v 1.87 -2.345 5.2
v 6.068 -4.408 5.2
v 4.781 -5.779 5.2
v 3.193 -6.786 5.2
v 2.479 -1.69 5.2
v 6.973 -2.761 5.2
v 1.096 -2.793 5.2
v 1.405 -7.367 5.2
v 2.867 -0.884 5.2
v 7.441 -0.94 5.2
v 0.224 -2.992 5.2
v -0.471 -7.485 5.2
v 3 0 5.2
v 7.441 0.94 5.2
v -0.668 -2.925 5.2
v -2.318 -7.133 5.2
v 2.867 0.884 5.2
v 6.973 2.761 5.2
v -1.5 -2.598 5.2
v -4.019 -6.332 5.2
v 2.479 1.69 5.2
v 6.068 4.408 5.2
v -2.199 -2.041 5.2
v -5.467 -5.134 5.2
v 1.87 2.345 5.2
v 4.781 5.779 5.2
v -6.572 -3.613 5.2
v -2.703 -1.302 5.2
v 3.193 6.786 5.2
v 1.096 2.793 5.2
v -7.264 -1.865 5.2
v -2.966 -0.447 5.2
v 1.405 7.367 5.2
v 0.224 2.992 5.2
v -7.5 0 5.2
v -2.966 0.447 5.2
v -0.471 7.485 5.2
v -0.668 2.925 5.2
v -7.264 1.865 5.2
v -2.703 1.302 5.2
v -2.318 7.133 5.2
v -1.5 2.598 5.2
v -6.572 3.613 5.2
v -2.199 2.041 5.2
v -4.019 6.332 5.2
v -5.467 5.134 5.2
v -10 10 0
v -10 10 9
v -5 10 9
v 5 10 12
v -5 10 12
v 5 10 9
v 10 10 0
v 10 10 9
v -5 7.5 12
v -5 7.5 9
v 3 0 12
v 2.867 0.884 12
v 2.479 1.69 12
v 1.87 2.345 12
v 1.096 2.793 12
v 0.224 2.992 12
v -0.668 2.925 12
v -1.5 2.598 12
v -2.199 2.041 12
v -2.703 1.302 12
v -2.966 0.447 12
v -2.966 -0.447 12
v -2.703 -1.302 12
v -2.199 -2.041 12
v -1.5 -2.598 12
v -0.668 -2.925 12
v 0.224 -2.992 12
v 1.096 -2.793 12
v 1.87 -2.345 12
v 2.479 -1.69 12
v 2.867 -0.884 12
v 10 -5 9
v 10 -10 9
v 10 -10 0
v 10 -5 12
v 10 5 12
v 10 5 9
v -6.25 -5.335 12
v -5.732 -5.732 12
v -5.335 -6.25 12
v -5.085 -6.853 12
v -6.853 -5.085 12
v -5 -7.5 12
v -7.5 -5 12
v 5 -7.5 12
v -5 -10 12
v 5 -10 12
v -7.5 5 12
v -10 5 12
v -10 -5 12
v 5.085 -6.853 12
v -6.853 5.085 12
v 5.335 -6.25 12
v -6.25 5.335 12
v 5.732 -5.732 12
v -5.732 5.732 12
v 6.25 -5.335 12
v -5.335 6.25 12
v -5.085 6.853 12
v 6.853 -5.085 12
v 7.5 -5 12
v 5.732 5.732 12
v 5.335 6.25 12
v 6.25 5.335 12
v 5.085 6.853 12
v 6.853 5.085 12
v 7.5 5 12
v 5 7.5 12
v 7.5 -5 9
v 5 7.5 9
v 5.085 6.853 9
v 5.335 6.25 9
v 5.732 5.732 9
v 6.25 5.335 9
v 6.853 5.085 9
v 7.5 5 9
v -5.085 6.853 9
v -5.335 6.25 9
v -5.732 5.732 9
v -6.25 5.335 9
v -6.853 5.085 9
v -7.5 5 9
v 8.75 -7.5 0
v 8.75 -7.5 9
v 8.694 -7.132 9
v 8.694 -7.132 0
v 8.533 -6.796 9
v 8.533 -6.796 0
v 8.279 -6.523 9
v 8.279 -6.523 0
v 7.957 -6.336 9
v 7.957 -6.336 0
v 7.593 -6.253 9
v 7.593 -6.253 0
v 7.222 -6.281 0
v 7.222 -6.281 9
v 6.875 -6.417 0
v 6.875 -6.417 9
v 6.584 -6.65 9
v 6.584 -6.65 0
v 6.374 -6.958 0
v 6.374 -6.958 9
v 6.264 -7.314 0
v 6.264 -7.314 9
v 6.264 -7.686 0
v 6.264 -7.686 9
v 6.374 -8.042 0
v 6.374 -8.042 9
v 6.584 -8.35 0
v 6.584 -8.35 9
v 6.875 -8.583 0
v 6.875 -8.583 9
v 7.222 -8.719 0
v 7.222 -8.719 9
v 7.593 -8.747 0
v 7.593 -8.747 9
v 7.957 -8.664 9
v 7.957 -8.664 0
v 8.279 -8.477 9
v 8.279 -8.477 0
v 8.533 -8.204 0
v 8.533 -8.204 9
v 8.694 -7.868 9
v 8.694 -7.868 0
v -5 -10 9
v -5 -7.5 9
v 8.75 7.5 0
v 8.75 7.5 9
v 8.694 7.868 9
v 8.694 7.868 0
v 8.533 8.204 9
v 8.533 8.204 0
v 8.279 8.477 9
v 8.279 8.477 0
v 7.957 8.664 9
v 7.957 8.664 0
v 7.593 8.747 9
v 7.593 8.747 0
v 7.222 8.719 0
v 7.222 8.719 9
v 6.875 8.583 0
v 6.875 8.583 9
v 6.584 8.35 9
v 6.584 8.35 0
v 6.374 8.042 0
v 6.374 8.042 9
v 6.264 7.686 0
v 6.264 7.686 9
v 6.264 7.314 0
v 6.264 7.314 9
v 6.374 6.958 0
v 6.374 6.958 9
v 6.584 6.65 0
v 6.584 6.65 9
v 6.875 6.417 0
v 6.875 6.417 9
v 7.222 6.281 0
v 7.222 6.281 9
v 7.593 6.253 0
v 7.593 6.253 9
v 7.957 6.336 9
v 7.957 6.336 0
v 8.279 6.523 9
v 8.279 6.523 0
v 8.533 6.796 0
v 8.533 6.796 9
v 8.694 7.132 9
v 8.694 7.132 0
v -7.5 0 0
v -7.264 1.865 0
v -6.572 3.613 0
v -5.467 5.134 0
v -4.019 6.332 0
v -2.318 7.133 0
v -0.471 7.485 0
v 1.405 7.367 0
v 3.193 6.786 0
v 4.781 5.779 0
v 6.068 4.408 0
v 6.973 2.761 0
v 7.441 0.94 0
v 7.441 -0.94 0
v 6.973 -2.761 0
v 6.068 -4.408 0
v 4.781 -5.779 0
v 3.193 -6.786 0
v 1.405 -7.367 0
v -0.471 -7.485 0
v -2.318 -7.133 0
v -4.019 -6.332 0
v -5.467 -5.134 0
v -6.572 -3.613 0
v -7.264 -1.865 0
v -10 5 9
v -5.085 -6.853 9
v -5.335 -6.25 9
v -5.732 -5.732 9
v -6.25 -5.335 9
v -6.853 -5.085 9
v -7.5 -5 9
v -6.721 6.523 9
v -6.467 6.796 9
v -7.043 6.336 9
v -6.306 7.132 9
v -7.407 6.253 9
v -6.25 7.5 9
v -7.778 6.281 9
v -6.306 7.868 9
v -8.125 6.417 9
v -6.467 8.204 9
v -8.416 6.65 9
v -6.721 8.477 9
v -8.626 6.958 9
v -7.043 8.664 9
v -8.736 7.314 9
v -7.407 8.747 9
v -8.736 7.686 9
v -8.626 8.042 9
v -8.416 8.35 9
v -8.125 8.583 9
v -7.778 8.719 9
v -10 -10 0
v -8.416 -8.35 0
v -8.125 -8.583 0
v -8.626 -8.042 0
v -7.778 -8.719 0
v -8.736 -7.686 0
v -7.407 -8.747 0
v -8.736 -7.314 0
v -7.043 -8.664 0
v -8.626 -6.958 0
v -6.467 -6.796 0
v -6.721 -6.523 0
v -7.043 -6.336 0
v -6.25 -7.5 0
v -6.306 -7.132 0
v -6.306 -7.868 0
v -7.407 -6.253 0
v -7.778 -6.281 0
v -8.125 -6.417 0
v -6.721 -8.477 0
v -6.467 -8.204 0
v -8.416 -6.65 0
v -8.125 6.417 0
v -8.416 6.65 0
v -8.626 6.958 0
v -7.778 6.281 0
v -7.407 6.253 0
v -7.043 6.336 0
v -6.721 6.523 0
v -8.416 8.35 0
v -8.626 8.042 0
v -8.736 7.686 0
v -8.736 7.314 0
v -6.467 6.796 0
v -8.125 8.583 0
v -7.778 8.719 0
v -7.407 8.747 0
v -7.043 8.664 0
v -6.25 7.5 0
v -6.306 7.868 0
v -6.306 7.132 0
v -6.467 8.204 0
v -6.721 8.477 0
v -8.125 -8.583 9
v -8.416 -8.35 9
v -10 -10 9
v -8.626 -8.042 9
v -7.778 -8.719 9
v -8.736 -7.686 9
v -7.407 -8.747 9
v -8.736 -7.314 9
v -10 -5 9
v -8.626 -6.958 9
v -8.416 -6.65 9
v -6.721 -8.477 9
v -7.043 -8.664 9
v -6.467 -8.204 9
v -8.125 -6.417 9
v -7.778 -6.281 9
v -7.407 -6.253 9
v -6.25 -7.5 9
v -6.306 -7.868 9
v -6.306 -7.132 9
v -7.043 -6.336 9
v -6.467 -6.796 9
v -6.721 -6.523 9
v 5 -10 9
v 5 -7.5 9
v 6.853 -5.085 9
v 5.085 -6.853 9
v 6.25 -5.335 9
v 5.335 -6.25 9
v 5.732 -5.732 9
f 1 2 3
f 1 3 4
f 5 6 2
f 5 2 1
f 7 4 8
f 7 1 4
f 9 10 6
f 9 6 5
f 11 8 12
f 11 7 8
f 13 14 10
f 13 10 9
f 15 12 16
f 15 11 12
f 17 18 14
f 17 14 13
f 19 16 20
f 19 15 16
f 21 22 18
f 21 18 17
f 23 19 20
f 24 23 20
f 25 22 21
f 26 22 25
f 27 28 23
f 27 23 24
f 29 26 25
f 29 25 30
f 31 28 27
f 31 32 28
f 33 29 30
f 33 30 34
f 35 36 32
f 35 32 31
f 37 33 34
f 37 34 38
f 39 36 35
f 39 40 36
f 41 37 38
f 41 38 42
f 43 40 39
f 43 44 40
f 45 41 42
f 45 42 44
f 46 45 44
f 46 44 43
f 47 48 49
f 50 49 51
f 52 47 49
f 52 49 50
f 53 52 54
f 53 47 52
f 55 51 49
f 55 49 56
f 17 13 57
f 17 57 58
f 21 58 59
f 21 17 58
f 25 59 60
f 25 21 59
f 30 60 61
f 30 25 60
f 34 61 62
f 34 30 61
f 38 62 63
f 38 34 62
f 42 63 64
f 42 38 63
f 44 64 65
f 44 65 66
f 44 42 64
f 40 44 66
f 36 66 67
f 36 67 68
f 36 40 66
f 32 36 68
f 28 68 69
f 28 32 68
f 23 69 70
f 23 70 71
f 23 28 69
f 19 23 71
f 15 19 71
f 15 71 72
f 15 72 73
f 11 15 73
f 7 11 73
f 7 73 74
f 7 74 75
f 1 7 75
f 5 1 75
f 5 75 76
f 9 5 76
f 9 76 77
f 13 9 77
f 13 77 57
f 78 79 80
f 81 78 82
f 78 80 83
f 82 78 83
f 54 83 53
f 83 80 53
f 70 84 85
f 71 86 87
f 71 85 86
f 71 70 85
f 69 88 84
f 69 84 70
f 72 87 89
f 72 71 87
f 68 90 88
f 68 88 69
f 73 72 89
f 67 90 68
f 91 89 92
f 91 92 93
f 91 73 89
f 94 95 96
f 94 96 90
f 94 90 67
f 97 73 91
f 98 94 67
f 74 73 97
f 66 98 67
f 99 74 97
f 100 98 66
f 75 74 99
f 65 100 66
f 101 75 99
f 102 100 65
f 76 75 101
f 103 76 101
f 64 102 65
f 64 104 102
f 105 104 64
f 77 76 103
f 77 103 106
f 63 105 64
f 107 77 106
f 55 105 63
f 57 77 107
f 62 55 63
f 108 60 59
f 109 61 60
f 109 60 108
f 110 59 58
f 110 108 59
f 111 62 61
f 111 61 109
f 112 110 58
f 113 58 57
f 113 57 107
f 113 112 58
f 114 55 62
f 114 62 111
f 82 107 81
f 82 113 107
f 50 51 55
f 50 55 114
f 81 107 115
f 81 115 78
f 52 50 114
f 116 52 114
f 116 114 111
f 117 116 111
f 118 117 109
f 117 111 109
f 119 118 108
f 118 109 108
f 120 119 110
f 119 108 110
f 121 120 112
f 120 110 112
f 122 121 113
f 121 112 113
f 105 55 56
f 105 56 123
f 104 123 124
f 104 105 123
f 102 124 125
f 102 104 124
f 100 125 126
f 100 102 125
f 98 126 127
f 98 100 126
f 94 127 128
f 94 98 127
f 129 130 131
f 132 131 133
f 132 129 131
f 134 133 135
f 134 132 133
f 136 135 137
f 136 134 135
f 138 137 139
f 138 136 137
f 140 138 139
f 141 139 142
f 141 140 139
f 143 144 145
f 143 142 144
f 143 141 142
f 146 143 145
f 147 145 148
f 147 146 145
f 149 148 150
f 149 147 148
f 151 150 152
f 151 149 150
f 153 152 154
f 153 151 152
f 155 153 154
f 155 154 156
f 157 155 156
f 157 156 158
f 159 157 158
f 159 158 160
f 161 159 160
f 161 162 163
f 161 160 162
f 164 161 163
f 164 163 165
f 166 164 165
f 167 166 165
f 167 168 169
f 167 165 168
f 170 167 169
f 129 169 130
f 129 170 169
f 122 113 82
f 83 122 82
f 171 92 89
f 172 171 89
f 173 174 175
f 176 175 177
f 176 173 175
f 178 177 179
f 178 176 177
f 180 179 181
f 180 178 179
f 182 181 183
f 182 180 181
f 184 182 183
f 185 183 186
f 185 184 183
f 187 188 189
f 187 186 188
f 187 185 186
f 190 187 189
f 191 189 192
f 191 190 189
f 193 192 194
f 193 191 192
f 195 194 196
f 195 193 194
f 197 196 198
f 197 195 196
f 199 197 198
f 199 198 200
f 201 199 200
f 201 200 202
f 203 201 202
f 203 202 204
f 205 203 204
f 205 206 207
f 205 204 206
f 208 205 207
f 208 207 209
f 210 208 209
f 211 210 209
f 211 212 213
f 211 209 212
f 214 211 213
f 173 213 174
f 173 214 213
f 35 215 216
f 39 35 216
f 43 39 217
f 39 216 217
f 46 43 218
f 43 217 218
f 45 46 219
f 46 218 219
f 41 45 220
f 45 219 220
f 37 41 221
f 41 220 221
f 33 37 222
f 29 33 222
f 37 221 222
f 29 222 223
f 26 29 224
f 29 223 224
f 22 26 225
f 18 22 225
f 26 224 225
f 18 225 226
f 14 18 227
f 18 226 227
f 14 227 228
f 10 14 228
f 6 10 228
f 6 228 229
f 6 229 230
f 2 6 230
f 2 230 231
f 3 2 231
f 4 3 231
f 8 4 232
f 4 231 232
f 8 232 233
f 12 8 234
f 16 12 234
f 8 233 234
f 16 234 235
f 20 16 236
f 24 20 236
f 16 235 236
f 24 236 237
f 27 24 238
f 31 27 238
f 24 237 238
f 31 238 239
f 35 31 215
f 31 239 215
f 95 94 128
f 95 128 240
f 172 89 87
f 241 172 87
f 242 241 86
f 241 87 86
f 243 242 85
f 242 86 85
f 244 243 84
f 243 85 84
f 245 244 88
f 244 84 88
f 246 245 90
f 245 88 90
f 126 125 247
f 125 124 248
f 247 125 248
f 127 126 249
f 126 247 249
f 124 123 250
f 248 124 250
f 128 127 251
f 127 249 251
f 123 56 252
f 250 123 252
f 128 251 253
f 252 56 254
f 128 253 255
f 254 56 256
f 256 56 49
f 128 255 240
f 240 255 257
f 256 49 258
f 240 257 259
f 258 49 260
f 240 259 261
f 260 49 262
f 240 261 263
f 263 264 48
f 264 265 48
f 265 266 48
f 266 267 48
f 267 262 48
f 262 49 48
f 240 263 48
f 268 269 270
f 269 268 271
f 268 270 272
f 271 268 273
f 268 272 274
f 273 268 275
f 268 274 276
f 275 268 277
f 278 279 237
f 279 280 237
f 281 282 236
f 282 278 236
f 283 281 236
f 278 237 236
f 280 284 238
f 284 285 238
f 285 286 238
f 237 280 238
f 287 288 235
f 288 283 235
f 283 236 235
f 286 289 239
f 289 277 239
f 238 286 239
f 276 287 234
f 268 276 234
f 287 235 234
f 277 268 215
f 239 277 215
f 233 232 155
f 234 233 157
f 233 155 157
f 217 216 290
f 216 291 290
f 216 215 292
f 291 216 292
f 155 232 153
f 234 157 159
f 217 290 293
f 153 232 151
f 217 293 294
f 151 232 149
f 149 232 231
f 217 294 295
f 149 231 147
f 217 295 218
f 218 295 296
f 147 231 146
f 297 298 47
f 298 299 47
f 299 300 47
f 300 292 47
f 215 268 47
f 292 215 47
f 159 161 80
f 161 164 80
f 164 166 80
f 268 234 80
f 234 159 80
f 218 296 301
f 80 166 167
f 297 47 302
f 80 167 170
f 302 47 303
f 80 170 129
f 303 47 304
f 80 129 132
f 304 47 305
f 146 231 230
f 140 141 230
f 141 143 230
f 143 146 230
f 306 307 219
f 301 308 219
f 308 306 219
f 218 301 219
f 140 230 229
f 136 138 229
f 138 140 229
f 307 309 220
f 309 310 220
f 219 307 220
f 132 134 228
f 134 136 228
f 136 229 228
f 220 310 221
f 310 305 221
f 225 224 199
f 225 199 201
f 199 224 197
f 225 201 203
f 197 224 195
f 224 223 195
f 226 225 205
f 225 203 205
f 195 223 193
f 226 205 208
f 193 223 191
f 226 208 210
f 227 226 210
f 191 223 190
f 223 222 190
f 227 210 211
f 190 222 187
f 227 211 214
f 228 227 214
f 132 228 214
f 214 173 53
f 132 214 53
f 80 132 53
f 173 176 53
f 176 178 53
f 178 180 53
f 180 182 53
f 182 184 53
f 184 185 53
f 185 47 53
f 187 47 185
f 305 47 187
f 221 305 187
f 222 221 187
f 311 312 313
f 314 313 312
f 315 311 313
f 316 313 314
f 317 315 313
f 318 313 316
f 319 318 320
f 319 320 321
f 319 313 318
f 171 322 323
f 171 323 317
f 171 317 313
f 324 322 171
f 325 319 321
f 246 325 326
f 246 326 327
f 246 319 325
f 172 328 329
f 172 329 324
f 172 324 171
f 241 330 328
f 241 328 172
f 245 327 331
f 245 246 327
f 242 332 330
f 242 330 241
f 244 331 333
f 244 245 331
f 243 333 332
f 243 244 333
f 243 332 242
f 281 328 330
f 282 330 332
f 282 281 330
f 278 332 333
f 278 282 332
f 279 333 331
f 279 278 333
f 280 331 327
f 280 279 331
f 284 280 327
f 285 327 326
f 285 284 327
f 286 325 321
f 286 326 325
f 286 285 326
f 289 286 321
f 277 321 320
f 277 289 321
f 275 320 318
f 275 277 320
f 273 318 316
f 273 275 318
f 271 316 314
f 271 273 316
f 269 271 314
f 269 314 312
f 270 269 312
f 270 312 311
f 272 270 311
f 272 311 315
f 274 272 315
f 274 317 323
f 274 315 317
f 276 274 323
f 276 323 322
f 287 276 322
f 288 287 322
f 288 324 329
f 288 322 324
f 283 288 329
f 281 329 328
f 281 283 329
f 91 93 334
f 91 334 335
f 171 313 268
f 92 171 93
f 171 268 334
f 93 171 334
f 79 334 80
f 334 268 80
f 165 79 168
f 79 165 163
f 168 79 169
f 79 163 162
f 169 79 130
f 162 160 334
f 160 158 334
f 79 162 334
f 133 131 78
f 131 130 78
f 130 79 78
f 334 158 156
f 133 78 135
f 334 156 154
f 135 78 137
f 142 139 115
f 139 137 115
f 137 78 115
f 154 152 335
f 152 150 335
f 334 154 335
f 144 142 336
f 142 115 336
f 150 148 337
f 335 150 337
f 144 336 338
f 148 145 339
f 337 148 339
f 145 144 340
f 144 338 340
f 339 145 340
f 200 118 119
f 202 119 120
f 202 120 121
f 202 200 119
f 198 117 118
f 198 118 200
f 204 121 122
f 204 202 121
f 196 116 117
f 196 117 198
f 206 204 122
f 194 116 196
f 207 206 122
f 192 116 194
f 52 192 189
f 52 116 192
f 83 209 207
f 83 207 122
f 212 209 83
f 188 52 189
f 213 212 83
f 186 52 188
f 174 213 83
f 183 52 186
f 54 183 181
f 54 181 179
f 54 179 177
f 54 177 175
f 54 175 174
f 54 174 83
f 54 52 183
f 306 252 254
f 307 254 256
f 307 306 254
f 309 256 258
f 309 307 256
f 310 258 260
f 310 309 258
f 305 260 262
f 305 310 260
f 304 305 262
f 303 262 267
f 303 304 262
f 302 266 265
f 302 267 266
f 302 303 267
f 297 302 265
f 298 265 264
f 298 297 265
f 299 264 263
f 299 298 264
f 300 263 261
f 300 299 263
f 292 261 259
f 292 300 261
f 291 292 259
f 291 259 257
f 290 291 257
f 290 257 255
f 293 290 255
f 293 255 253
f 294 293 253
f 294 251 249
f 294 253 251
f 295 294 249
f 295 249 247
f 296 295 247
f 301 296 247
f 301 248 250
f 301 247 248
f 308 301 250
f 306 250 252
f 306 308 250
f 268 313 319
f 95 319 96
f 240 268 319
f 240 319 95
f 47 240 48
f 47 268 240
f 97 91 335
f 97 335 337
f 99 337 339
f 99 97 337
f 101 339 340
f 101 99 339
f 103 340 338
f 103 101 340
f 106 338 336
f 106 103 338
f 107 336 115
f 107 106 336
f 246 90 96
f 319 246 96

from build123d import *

# Parameters (mm, degrees)
SKETCH_1_W          = 20
SKETCH_1_H          = 20
SKETCH_1_R          = 1.25
SKETCH_1_R_2        = 3
EXTRUDE_1_DEPTH     = 12
SKETCH_2_R          = 7.5
CUT_EXTRUDE_1_DEPTH = 5.2
CUT_EXTRUDE_2_DEPTH = 3


with BuildPart() as part:
    # 스케치1 → 보스-돌출1 (new body)
    with BuildSketch(Plane.XY):
        Rectangle(SKETCH_1_W, SKETCH_1_H)
        with Locations((-7.5, 7.5)):
            Circle(SKETCH_1_R, mode=Mode.SUBTRACT)
        with Locations((7.5, 7.5)):
            Circle(SKETCH_1_R, mode=Mode.SUBTRACT)
        with Locations((-7.5, -7.5)):
            Circle(SKETCH_1_R, mode=Mode.SUBTRACT)
        with Locations((7.5, -7.5)):
            Circle(SKETCH_1_R, mode=Mode.SUBTRACT)
        Circle(SKETCH_1_R_2, mode=Mode.SUBTRACT)
    extrude(amount=EXTRUDE_1_DEPTH)

    # 스케치2 → 컷-돌출1 (cut)
    with BuildSketch(Plane(origin=(0, 0, 0), x_dir=(-1, 0, 0), z_dir=(0, 0, -1))):
        Circle(SKETCH_2_R)
    extrude(amount=-CUT_EXTRUDE_1_DEPTH, mode=Mode.SUBTRACT)

    # 스케치3 → 컷-돌출2 (cut)
    with BuildSketch(Plane.XY.offset(12)):
        with BuildLine():
            Line((-10, -10), (-5, -10))
            Line((-5, -10), (-5, -7.5))
            ThreePointArc((-5, -7.5), (-5.732233047, -5.732233047), (-7.5, -5))
            Line((-7.5, -5), (-10, -5))
            Line((-10, -5), (-10, -10))
        make_face()
        with BuildLine():
            Line((-7.5, 5), (-10, 5))
            Line((-10, 5), (-10, 10))
            Line((-10, 10), (-5, 10))
            Line((-5, 10), (-5, 7.5))
            ThreePointArc((-5, 7.5), (-5.732233047, 5.732233047), (-7.5, 5))
        make_face()
        with BuildLine():
            Line((7.5, 5), (10, 5))
            Line((10, 5), (10, 10))
            Line((10, 10), (5, 10))
            Line((5, 10), (5, 7.5))
            ThreePointArc((5, 7.5), (5.732233047, 5.732233047), (7.5, 5))
        make_face()
        with BuildLine():
            Line((7.5, -5), (10, -5))
            Line((10, -5), (10, -10))
            Line((10, -10), (5, -10))
            Line((5, -10), (5, -7.5))
            ThreePointArc((5, -7.5), (5.732233047, -5.732233047), (7.5, -5))
        make_face()
    extrude(amount=-CUT_EXTRUDE_2_DEPTH, mode=Mode.SUBTRACT)


solid = part.part
